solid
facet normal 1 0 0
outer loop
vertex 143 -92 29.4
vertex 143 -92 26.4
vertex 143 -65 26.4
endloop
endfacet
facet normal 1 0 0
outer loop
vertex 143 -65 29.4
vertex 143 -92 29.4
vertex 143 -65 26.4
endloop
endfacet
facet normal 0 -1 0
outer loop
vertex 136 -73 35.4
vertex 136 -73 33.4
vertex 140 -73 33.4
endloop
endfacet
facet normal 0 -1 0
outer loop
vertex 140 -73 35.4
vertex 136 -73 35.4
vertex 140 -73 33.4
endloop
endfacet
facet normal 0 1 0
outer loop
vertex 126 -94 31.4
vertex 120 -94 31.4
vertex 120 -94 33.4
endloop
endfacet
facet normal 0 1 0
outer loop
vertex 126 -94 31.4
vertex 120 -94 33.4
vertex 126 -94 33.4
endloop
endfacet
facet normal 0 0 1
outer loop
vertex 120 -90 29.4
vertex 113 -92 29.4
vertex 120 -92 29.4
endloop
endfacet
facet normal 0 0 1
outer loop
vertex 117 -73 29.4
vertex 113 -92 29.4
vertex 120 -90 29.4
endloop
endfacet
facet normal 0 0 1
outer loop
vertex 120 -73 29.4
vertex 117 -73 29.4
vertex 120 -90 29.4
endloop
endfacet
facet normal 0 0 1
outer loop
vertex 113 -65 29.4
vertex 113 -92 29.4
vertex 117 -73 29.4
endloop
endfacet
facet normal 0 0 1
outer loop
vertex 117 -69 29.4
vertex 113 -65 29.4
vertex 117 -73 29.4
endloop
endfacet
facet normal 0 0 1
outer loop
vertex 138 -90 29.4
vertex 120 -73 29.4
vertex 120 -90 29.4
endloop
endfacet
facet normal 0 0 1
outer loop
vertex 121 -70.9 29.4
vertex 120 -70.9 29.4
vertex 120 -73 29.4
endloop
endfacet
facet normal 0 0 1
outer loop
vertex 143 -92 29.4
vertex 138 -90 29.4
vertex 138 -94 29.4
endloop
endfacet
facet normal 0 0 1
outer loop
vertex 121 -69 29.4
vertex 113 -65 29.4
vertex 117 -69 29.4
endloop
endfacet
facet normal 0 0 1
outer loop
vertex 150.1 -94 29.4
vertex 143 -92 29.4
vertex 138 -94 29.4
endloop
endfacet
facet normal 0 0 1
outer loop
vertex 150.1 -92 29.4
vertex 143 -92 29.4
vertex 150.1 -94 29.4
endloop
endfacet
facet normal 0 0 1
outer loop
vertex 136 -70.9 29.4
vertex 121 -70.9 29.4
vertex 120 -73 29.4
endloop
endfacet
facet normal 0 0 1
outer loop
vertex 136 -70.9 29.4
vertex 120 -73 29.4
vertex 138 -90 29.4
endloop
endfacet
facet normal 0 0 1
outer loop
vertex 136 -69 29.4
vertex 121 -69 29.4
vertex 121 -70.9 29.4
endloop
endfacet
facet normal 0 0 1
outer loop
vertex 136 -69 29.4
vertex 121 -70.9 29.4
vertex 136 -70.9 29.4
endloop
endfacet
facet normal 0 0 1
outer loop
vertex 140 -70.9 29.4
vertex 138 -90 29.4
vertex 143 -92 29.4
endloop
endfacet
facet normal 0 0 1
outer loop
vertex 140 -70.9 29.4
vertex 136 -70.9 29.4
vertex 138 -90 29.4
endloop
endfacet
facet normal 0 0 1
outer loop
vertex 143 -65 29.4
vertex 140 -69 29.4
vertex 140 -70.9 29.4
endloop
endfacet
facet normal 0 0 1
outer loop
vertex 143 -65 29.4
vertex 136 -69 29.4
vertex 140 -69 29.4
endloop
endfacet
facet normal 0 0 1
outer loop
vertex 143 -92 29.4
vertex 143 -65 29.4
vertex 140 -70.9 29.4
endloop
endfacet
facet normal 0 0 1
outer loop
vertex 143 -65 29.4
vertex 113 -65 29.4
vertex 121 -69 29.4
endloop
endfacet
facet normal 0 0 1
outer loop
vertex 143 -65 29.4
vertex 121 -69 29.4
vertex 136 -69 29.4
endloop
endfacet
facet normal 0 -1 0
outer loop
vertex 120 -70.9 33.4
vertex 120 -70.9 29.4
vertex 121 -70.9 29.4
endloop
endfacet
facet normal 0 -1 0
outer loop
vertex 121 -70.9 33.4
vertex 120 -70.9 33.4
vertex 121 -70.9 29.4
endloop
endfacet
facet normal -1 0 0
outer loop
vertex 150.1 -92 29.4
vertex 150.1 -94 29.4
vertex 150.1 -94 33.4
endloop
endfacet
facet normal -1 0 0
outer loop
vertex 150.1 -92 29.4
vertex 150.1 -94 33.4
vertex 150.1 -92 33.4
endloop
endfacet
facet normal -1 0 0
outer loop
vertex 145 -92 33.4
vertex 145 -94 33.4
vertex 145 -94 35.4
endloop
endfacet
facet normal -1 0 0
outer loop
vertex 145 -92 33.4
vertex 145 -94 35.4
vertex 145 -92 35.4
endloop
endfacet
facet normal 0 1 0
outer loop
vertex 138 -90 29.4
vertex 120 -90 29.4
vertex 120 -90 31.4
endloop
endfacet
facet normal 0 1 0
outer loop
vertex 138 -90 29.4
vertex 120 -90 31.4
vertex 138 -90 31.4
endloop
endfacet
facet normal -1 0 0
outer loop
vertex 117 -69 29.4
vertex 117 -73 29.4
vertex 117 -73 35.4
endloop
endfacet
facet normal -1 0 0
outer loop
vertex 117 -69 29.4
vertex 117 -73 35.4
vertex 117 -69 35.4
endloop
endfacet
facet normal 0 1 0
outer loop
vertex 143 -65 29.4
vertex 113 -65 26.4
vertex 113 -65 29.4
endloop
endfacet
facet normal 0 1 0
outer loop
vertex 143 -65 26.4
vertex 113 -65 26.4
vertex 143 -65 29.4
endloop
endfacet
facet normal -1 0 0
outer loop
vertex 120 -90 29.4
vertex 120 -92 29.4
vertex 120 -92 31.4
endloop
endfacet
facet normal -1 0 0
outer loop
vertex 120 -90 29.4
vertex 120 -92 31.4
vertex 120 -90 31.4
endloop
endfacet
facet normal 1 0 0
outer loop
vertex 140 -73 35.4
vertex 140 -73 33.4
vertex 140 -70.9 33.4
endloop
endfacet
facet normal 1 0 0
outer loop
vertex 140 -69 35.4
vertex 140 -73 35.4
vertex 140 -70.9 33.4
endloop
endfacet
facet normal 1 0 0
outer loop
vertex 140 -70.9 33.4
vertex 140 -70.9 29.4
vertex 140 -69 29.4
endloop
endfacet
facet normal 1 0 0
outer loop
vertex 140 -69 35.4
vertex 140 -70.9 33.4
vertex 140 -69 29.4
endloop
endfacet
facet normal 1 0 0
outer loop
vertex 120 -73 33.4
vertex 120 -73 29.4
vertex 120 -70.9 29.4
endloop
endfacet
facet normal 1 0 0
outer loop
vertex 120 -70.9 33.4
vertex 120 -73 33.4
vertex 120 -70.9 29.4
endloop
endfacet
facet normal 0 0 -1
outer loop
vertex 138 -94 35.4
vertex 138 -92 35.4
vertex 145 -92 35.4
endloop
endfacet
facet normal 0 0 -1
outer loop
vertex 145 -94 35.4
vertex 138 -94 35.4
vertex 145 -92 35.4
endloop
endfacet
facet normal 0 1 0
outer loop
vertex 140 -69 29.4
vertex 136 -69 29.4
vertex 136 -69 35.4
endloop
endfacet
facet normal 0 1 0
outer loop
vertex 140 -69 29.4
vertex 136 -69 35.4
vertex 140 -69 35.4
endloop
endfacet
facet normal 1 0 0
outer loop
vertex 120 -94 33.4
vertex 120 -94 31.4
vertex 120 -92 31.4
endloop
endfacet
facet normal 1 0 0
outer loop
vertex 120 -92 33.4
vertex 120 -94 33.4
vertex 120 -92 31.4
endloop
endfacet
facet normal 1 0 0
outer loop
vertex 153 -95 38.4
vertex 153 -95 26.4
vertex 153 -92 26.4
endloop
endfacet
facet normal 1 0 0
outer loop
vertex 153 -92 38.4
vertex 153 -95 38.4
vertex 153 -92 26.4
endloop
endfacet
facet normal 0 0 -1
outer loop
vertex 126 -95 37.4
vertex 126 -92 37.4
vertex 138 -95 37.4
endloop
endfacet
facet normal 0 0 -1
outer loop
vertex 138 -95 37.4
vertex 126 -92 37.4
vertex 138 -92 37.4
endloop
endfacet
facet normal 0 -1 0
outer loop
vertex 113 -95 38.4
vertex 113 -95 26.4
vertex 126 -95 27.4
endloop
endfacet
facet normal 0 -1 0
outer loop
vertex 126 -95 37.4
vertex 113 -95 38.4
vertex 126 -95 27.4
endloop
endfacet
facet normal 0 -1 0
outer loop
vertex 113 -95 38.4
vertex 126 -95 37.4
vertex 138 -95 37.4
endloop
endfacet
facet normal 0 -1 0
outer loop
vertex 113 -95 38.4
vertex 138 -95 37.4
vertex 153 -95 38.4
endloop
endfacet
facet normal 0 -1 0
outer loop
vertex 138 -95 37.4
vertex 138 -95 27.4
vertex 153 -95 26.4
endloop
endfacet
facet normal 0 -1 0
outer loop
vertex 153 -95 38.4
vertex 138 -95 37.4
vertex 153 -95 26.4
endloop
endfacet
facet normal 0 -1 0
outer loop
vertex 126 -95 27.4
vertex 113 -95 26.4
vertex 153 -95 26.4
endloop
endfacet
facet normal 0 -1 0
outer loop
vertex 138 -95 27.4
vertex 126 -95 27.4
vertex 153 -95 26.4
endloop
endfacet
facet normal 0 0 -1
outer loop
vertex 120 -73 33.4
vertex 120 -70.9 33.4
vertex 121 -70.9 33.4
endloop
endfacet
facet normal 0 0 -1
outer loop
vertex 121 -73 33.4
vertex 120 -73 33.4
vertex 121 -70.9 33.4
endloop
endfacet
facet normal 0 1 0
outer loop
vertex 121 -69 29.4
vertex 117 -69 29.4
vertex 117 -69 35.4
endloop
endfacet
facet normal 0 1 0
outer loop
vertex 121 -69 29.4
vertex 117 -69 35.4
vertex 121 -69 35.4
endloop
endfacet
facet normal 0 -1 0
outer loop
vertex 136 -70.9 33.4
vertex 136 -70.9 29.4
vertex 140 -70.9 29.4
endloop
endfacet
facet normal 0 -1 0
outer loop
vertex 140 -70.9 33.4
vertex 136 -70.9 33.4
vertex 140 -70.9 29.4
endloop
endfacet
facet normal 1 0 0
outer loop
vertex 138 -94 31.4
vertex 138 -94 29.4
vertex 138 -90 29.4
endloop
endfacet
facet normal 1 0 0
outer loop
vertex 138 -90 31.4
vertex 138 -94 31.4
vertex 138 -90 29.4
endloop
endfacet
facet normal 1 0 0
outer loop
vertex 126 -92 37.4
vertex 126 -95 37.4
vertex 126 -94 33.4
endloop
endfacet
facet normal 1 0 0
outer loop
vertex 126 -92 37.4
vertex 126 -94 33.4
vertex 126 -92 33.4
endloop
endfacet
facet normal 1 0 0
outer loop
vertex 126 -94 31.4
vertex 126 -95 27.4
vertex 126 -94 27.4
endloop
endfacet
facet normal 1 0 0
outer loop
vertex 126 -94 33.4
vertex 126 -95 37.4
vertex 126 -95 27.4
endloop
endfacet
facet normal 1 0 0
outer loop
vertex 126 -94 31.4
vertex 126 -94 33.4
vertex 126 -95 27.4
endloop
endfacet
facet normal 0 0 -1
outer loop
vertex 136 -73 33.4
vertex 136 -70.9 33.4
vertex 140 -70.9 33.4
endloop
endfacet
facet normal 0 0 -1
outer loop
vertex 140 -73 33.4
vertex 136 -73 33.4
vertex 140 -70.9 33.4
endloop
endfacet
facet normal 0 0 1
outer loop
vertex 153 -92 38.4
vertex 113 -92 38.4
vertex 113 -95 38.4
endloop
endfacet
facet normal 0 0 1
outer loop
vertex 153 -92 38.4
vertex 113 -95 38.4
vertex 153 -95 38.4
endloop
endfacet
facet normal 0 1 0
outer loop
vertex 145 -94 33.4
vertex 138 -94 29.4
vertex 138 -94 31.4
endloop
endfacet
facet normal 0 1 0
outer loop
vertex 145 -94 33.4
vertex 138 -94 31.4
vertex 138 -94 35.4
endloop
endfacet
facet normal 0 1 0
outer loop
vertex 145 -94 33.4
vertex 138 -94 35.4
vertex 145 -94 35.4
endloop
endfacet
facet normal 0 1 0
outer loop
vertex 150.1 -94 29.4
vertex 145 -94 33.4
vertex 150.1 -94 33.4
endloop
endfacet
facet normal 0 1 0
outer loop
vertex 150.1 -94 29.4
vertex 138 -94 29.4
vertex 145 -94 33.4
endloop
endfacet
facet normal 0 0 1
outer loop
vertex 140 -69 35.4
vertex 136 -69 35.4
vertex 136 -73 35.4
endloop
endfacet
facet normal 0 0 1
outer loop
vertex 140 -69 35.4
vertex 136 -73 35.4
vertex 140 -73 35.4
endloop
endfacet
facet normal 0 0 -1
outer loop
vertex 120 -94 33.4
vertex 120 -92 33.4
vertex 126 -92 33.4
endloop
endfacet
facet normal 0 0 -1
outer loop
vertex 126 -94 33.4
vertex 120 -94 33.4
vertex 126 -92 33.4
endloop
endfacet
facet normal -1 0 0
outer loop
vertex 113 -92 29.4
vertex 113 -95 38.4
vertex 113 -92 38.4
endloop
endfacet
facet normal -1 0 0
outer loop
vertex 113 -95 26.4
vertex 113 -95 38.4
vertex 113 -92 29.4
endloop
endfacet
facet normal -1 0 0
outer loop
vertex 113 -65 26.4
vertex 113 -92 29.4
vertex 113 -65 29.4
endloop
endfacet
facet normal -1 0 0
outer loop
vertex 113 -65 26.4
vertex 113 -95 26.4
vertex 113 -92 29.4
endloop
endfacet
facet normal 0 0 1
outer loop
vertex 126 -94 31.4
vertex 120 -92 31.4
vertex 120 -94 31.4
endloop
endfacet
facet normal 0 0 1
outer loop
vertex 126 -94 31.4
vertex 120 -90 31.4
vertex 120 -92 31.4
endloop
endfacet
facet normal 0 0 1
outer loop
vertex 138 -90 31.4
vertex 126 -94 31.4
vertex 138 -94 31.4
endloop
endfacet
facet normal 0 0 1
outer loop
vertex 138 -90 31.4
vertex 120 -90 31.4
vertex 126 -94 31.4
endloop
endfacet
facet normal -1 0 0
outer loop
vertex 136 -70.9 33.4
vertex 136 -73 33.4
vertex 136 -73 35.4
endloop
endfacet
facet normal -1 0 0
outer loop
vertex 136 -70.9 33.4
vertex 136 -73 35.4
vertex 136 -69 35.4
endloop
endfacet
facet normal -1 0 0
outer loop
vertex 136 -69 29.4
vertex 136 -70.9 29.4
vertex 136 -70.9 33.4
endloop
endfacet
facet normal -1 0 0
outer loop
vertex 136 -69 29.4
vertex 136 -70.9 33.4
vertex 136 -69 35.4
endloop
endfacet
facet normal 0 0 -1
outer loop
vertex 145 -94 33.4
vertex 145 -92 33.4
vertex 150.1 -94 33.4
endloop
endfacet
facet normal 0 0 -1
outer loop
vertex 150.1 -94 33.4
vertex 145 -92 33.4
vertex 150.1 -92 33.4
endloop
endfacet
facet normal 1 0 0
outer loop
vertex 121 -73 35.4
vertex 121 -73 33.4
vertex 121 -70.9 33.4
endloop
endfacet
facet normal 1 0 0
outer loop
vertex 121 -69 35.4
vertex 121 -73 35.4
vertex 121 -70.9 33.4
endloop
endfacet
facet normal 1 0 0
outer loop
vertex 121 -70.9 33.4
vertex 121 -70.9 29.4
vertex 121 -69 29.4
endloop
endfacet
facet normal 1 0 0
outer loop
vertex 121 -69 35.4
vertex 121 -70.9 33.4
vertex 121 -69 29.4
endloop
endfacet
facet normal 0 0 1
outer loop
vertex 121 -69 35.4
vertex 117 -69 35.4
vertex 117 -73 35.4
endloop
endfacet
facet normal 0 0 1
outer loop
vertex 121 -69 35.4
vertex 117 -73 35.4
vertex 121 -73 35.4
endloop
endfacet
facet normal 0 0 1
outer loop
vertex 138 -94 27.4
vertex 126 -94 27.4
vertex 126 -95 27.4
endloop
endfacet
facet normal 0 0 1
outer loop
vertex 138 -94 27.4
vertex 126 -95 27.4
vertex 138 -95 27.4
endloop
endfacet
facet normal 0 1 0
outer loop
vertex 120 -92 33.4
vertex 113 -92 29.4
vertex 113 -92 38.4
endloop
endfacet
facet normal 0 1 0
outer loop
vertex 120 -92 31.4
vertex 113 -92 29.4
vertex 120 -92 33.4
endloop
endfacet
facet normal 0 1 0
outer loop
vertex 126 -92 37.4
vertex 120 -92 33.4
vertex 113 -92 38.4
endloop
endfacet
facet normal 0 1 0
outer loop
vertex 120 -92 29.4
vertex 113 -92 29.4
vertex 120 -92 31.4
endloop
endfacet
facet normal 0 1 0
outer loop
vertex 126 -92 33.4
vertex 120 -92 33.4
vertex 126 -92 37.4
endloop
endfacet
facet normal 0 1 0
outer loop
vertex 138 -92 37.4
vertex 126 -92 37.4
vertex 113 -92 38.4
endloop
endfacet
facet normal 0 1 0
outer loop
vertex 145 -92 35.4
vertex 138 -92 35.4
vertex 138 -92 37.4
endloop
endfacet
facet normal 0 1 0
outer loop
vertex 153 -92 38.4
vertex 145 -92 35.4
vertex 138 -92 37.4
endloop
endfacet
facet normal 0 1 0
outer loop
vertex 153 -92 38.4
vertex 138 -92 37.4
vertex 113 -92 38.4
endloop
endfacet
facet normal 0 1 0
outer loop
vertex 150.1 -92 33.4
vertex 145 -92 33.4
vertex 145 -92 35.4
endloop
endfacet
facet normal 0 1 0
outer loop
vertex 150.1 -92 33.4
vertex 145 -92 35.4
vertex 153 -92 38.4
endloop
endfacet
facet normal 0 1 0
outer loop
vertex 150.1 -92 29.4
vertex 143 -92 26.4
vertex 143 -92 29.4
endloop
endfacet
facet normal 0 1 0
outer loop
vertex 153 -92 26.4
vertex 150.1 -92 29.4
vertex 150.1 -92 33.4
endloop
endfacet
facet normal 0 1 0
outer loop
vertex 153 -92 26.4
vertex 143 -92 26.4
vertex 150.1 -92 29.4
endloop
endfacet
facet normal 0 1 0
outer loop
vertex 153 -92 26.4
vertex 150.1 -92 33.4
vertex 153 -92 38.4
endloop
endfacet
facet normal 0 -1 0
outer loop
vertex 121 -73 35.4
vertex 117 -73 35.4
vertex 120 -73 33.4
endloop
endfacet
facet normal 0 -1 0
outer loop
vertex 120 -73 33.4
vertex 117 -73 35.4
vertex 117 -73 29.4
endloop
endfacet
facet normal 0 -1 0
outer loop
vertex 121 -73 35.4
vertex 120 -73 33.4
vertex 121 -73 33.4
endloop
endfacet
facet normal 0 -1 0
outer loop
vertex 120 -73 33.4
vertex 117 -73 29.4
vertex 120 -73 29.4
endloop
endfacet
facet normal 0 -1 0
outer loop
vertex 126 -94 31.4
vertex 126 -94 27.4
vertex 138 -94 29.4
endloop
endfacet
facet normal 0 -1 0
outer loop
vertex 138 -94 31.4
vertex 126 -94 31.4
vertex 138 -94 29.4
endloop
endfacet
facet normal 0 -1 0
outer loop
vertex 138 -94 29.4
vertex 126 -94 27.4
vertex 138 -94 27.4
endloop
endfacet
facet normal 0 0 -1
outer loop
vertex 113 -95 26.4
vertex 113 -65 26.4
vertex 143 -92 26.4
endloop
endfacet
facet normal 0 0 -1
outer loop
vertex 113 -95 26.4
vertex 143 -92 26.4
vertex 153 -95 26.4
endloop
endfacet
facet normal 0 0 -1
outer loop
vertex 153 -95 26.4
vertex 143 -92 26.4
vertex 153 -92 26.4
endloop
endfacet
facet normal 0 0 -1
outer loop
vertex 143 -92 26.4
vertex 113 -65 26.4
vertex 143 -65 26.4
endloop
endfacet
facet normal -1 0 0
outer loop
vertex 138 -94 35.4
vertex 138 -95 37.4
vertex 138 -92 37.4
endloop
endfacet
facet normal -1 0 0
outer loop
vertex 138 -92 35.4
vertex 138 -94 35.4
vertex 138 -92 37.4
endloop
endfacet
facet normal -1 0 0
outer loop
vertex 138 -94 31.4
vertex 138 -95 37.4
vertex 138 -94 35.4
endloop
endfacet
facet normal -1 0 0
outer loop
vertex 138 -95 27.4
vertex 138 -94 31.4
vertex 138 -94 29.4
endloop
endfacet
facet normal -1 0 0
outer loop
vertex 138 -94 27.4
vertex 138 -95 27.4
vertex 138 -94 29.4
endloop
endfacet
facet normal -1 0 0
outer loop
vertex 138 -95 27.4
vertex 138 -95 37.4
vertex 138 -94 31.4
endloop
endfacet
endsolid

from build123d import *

# Parameters (mm, degrees)
BOX007_W     = 7
BOX007_H     = 4
BOX007_DEPTH = 6
BOX002_W     = 30.1
BOX002_H     = 23.1
BOX002_DEPTH = 4
BOX003_W     = 12
BOX003_H     = 7
BOX003_DEPTH = 10
BOX001_W     = 40
BOX001_H     = 3
BOX001_DEPTH = 12
BOX004_W     = 4
BOX004_H     = 4
BOX004_DEPTH = 6
BOX005_W     = 4
BOX005_H     = 4
BOX005_DEPTH = 6
BOX008_W     = 30
BOX008_H     = 30
BOX008_DEPTH = 3
BOX006_W     = 19
BOX006_H     = 4
BOX006_DEPTH = 5


with BuildPart() as cube007:
    # Box007 → Box007 (new body)
    with BuildSketch(Plane(origin=(25, 1, 3), x_dir=(1, 0, 0), z_dir=(0, 0, 1))):
        with Locations((3.5, 2)):
            Rectangle(BOX007_W, BOX007_H)
    extrude(amount=BOX007_DEPTH)


with BuildPart() as cube002:
    # Box002 → Box002 (new body)
    with BuildSketch(Plane(origin=(7, 1, 3), x_dir=(1, 0, 0), z_dir=(0, 0, 1))):
        with Locations((15.05, 11.55)):
            Rectangle(BOX002_W, BOX002_H)
    extrude(amount=BOX002_DEPTH)


with BuildPart() as cube003:
    # Box003 → Box003 (new body)
    with BuildSketch(Plane(origin=(13, -4, 1), x_dir=(1, 0, 0), z_dir=(0, 0, 1))):
        with Locations((6, 3.5)):
            Rectangle(BOX003_W, BOX003_H)
    extrude(amount=BOX003_DEPTH)


with BuildPart() as cube001:
    # Box001 → Box001 (new body)
    with BuildSketch(Plane.XY):
        with Locations((20, 1.5)):
            Rectangle(BOX001_W, BOX001_H)
    extrude(amount=BOX001_DEPTH)


with BuildPart() as cube004:
    # Box004 → Box004 (new body)
    with BuildSketch(Plane(origin=(23, 22, 3), x_dir=(1, 0, 0), z_dir=(0, 0, 1))):
        with Locations((2, 2)):
            Rectangle(BOX004_W, BOX004_H)
    extrude(amount=BOX004_DEPTH)


with BuildPart() as cube005:
    # Box005 → Box005 (new body)
    with BuildSketch(Plane(origin=(4, 22, 3), x_dir=(1, 0, 0), z_dir=(0, 0, 1))):
        with Locations((2, 2)):
            Rectangle(BOX005_W, BOX005_H)
    extrude(amount=BOX005_DEPTH)


with BuildPart() as cut001:
    # Box008 → Box008 (new body)
    with BuildSketch(Plane.XY):
        with Locations((15, 15)):
            Rectangle(BOX008_W, BOX008_H)
    extrude(amount=BOX008_DEPTH)

    # Fusion001: union Cube001, Cube004, Cube005
    add(cube001.part)
    add(cube004.part)
    add(cube005.part)

    # Cut: cut Cube003
    add(cube003.part, mode=Mode.SUBTRACT)

    # Cut001: cut Cube002
    add(cube002.part, mode=Mode.SUBTRACT)


with BuildPart() as ttl_usb_ver1:
    # Box006 → Box006 (new body)
    with BuildSketch(Plane(origin=(7, 1, 0), x_dir=(1, 0, 0), z_dir=(0, 0, 1))):
        with Locations((9.5, 2)):
            Rectangle(BOX006_W, BOX006_H)
    extrude(amount=BOX006_DEPTH)

    # Fusion002: union Cut001
    add(cut001.part)

    # Cut002: cut Cube007
    add(cube007.part, mode=Mode.SUBTRACT)


with BuildPart() as ttl_usb_ver1_1:
    # Cut002 placement: moved
    add(ttl_usb_ver1.part.moved(Location((113, -95, 26.4))))


solid = ttl_usb_ver1_1.part
